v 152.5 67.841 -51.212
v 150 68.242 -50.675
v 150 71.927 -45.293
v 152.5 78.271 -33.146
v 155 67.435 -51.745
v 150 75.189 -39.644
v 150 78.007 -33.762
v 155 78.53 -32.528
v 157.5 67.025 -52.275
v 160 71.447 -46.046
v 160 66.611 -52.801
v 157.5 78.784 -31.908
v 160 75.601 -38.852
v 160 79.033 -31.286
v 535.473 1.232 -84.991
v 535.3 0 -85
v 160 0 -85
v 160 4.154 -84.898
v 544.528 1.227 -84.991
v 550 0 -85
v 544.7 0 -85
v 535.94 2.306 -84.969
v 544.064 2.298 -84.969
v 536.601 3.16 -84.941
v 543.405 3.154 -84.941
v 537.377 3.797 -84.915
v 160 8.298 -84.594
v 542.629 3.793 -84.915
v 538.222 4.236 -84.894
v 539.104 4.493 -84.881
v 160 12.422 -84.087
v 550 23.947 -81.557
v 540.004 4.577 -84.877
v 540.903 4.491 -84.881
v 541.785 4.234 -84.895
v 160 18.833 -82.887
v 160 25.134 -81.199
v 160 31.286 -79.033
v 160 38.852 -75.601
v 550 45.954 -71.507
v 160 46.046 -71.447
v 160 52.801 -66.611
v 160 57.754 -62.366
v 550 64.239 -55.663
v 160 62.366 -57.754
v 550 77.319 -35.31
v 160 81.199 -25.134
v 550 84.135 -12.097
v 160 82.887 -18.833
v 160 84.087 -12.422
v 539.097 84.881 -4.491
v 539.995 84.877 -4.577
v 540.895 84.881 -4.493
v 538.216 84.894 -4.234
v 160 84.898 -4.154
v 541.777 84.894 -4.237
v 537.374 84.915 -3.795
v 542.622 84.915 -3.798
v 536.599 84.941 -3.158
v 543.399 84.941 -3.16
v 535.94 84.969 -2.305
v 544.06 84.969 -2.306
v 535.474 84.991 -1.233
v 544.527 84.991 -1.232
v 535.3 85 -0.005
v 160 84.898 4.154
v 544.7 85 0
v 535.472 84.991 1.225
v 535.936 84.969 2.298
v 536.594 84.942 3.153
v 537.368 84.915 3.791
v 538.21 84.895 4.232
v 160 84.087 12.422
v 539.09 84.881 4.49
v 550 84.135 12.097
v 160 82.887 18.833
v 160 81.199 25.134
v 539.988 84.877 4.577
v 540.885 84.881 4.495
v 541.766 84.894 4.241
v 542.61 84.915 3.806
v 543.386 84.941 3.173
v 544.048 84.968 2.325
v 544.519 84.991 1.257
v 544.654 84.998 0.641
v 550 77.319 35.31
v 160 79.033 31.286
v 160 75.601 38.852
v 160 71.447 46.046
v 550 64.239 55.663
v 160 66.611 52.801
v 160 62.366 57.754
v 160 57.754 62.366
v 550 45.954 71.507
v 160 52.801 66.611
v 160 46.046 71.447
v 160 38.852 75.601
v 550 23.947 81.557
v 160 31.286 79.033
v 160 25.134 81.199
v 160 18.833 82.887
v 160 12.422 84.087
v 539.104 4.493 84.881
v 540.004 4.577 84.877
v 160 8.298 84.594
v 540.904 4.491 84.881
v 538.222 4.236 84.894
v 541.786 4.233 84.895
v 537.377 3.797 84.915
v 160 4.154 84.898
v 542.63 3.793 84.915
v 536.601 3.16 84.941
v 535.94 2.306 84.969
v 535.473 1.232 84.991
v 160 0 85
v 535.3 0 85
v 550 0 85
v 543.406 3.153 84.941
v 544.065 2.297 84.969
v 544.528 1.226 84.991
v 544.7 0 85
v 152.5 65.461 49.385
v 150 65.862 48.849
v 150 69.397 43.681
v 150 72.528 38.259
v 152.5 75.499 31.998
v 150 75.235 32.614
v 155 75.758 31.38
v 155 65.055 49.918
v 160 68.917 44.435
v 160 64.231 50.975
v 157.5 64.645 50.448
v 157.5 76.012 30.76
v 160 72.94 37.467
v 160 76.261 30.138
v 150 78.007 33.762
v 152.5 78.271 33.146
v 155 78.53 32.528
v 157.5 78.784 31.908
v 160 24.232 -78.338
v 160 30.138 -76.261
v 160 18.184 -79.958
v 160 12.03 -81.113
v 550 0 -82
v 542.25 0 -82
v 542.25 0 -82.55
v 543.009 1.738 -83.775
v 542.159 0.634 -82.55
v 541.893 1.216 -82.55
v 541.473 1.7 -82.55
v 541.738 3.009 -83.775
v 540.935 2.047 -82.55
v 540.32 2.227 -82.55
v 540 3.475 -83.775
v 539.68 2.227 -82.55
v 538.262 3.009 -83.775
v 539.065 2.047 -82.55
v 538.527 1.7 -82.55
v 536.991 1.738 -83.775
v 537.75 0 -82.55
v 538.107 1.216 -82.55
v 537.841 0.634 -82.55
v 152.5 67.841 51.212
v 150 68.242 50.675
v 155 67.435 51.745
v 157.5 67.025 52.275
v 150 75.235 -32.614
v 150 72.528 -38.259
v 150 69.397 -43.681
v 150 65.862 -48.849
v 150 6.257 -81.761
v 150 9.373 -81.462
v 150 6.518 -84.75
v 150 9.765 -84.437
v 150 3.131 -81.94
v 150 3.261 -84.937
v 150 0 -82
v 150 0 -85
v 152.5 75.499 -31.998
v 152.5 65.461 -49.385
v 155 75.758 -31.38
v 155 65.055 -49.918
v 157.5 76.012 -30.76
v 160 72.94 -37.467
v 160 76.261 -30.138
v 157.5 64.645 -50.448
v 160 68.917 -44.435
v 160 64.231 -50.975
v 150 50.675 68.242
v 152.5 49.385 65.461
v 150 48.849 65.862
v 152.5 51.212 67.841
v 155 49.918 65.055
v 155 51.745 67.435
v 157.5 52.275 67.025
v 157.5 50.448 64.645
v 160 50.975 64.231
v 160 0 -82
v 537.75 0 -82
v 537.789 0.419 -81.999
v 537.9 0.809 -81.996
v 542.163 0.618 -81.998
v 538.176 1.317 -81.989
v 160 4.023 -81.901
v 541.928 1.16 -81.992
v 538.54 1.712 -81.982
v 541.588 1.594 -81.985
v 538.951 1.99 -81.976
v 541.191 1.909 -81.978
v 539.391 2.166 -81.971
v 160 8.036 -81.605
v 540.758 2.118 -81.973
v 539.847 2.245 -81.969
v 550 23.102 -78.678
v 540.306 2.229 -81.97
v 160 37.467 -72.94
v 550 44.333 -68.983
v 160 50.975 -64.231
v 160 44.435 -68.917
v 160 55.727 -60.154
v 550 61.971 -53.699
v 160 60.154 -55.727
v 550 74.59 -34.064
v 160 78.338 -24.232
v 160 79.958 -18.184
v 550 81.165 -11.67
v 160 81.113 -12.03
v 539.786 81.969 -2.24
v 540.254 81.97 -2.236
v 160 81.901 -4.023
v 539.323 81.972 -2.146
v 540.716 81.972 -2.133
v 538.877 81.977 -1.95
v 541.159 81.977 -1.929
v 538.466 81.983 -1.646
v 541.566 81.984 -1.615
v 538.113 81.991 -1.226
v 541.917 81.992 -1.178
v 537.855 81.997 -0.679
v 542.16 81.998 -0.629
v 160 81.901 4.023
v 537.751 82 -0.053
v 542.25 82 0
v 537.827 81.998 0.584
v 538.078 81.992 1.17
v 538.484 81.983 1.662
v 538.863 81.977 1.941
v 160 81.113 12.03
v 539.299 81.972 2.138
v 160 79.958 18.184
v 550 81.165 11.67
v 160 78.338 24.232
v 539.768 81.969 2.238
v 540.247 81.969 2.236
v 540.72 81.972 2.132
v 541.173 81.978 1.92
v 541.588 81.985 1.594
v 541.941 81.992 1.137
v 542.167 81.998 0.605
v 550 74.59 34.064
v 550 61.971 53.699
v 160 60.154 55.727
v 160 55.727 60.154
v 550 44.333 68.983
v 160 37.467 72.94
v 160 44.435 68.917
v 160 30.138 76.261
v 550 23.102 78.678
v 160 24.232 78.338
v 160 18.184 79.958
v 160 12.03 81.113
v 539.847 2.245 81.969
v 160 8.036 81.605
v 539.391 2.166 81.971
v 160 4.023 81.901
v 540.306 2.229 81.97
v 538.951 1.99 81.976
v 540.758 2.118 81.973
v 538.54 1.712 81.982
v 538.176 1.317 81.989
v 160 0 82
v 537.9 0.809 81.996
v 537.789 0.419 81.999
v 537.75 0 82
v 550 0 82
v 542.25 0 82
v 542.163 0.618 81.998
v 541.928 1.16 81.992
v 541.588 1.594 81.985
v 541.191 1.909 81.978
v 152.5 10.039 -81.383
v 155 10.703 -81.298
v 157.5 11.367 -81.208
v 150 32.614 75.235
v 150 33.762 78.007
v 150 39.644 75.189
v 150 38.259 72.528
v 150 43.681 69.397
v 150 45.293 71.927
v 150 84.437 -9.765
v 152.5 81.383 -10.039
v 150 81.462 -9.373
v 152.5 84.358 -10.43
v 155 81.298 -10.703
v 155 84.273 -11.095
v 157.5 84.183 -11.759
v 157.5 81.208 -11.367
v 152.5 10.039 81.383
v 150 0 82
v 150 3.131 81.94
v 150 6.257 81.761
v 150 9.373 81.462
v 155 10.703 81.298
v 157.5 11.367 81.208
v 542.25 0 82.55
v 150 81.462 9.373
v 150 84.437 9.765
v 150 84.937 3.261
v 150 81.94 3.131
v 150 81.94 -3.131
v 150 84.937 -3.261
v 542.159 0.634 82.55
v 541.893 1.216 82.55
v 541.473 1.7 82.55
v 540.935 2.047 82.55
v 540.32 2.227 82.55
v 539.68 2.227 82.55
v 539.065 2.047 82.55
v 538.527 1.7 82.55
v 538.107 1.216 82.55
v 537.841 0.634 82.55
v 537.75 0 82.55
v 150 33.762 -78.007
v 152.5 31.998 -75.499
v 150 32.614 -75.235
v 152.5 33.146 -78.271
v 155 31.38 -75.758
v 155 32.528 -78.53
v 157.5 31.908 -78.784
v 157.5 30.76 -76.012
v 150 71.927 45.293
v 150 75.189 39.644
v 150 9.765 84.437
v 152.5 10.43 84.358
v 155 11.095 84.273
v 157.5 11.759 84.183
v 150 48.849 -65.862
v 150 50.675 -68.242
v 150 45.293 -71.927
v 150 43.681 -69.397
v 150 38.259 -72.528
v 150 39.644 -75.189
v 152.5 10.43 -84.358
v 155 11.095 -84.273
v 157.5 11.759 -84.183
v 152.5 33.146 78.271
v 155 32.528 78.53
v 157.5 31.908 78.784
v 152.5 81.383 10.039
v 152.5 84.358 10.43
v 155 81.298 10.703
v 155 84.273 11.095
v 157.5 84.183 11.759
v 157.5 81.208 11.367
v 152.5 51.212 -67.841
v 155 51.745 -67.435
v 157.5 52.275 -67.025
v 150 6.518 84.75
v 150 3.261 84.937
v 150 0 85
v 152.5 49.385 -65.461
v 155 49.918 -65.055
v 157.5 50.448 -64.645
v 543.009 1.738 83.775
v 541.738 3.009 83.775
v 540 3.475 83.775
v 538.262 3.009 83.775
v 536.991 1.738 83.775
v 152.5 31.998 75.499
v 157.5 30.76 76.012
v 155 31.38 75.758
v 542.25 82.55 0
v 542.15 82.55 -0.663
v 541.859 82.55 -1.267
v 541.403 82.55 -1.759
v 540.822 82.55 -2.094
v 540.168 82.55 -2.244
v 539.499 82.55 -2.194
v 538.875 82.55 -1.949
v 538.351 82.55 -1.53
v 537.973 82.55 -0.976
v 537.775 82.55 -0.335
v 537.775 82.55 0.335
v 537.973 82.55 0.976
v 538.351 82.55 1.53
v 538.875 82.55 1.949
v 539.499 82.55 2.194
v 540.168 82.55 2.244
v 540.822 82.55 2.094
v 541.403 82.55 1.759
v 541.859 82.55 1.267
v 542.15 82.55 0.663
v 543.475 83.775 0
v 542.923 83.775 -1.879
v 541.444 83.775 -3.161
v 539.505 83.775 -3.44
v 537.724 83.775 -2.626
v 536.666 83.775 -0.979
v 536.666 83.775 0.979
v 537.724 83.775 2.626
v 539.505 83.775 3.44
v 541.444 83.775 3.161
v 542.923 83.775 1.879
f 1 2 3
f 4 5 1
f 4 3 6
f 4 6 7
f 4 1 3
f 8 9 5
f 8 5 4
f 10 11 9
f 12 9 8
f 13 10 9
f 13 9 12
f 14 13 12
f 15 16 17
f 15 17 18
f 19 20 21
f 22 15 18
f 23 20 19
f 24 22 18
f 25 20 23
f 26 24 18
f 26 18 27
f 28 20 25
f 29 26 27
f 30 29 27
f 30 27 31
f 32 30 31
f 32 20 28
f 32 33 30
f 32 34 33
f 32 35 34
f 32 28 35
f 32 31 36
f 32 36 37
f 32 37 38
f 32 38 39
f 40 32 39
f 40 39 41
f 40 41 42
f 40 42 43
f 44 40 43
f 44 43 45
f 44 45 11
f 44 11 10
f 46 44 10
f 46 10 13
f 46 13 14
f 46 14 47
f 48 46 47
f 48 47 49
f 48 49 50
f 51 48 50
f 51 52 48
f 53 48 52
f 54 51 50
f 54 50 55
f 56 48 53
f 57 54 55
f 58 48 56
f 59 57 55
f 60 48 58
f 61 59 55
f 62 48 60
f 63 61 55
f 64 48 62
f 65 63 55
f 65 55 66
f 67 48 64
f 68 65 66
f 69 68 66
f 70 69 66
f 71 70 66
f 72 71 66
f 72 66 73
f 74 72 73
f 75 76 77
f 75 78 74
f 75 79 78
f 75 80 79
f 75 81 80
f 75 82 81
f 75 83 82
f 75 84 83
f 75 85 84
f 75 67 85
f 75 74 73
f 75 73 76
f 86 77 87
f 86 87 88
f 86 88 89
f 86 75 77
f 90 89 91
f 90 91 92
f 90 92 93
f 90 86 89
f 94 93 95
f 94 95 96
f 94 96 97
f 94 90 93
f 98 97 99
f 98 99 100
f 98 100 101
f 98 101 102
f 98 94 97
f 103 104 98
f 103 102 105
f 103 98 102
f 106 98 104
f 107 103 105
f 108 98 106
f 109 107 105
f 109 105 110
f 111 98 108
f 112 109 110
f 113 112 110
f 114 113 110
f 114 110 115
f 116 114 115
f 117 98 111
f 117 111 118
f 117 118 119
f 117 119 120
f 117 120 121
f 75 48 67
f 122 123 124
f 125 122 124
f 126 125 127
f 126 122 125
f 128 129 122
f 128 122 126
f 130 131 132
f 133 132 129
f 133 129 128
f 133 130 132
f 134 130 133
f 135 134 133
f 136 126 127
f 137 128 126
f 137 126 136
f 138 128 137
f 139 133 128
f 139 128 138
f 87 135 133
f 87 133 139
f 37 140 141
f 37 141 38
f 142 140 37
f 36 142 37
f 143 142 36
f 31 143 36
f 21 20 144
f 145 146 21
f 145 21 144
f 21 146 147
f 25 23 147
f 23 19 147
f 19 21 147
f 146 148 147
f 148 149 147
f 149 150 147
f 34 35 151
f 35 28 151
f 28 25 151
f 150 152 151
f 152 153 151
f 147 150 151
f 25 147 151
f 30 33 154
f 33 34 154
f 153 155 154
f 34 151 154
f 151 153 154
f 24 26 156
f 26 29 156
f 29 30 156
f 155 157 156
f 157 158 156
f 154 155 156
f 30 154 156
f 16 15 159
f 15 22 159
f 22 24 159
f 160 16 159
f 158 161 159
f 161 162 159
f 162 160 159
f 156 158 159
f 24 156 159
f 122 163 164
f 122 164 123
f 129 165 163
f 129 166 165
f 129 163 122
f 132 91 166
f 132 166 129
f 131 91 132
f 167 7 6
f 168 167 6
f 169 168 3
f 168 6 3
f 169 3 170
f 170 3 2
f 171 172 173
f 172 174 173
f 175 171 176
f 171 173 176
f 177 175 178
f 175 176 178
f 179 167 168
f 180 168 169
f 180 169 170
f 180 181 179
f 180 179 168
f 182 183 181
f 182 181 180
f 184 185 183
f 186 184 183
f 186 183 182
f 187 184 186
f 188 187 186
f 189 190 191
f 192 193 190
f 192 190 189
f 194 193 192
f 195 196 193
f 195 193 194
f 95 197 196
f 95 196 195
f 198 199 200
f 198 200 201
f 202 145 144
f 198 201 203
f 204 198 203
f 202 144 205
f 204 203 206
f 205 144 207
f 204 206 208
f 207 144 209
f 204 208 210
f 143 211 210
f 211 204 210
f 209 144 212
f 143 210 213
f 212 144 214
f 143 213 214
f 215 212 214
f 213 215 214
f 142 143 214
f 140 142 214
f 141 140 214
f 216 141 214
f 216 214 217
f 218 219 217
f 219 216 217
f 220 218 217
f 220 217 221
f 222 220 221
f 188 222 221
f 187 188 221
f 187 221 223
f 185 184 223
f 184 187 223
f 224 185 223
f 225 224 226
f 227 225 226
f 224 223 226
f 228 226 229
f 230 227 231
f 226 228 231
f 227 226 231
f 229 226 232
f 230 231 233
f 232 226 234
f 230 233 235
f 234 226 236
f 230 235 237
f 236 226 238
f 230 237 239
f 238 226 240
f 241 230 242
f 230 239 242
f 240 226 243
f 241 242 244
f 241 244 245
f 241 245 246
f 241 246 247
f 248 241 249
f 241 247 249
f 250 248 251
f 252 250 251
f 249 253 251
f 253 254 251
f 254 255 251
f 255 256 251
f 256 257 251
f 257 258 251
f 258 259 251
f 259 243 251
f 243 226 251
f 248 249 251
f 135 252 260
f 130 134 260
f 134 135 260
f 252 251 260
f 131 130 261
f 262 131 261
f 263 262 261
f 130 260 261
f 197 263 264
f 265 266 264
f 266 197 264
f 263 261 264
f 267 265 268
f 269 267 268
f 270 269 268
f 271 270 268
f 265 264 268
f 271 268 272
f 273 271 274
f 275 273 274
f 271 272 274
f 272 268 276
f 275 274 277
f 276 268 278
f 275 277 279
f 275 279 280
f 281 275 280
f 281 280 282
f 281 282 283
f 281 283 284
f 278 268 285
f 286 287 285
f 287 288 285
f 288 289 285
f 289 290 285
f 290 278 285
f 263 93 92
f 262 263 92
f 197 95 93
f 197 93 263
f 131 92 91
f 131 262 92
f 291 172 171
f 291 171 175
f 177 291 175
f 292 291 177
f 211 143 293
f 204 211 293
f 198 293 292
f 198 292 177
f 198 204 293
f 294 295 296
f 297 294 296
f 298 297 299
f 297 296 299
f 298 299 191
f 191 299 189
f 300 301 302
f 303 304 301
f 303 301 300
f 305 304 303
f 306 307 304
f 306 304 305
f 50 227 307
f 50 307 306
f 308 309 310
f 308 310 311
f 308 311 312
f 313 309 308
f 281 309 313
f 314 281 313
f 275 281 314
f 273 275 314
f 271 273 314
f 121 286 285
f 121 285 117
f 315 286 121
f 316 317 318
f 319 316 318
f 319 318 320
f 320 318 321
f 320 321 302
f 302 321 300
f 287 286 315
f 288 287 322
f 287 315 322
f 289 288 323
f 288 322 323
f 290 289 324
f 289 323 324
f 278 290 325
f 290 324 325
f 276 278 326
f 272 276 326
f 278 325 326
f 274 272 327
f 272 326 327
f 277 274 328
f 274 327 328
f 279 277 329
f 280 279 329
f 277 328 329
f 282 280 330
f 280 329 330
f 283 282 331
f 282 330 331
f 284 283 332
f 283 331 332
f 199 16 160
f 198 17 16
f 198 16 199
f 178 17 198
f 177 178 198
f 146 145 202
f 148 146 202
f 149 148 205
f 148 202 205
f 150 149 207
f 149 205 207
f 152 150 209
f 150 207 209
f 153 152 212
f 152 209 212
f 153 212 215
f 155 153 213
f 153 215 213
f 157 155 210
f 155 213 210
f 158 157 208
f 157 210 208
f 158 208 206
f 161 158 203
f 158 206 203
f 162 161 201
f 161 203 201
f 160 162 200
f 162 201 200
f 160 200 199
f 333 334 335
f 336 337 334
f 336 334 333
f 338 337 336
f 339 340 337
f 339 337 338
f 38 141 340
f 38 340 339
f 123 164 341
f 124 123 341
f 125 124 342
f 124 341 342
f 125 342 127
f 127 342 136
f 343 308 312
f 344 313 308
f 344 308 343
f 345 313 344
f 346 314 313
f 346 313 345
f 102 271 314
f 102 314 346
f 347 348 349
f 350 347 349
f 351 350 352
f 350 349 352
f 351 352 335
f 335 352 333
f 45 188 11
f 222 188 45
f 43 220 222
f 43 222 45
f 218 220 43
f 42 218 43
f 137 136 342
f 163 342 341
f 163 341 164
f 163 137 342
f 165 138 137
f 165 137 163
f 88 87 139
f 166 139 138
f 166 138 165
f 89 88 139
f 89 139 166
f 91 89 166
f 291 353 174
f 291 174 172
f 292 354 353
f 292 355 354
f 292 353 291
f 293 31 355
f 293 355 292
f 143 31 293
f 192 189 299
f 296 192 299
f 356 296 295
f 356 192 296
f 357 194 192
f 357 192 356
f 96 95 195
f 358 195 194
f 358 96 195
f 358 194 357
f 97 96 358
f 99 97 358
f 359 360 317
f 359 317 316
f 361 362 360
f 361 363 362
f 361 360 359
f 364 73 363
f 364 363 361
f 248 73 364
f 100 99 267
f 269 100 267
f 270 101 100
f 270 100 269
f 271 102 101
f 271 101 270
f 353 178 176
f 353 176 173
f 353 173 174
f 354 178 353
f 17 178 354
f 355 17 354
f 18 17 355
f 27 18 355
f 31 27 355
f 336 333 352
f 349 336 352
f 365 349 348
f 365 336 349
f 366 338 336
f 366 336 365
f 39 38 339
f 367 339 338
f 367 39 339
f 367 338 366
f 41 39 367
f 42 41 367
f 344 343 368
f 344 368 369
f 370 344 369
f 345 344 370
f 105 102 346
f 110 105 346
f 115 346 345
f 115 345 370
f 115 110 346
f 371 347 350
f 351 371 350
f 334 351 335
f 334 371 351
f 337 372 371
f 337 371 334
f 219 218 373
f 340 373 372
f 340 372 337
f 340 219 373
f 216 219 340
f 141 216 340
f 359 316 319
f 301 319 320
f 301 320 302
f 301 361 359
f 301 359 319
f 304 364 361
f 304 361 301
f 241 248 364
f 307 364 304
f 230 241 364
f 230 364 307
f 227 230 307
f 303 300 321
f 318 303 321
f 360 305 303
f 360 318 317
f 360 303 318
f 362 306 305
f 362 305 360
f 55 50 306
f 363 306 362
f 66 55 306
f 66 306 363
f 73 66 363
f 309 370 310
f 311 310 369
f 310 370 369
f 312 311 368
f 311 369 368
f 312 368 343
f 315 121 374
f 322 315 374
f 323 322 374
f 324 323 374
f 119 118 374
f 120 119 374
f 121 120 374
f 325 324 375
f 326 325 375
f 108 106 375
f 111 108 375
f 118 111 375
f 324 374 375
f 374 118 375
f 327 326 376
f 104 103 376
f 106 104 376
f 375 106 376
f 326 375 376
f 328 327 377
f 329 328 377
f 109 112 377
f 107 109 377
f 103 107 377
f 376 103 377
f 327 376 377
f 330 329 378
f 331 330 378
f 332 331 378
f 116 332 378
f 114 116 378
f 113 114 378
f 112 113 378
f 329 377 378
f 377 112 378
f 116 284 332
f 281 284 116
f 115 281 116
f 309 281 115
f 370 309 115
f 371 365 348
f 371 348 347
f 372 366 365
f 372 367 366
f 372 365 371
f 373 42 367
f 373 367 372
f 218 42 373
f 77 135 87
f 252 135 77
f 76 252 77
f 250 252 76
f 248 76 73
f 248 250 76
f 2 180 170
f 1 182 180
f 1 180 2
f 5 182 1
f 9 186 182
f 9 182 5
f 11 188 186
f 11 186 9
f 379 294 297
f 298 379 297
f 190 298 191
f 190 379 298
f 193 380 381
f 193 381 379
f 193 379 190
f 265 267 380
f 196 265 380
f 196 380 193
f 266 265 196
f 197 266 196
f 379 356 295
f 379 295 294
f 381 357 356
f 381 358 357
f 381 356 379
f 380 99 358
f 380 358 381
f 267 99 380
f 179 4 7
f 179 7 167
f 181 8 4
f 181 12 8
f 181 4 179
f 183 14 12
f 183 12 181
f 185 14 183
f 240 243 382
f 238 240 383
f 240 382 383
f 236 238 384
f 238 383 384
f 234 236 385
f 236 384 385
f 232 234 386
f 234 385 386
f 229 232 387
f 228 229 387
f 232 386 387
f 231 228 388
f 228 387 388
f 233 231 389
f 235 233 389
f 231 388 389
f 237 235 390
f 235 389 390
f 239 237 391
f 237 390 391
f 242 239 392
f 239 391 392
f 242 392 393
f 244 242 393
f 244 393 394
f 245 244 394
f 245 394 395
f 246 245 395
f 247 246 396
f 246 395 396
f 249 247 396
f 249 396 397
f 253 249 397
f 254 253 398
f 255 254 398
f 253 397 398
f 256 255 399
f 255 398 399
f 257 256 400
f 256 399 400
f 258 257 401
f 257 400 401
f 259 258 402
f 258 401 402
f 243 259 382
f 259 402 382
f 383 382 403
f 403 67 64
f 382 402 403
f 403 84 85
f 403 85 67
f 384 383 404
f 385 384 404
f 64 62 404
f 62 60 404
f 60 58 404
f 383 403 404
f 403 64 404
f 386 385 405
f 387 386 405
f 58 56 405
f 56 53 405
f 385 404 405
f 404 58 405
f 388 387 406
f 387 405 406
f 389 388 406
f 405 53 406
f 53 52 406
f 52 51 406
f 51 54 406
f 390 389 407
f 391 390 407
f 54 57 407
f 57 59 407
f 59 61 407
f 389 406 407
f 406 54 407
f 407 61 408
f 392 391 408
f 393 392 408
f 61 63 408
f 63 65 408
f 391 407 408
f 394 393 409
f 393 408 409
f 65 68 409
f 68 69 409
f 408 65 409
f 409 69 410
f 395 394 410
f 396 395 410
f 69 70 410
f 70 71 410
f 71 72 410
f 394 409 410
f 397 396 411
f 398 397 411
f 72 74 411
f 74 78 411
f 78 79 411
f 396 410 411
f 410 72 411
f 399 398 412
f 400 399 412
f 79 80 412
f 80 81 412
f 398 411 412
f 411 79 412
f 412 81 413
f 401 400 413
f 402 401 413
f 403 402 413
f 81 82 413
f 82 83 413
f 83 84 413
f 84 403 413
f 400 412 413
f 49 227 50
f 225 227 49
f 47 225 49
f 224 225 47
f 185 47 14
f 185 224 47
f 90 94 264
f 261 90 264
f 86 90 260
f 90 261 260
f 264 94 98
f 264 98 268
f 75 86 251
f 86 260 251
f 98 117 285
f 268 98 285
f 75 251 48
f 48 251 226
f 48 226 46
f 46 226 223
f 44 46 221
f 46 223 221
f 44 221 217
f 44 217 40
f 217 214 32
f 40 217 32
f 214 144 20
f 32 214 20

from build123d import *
from build123d.topology import SkipClean

# Parameters (mm, degrees)
SKETCH1_W                      = 390
SKETCH1_H                      = 3
BOSS_EXTRUDE1_DEPTH            = 5
DRAFT1_ANGLE                   = -15
CIRPATTERN1_COUNT              = 12
DRAFT1_OF_CIRPATTERN1_2_ANGLE  = -15
DRAFT1_OF_CIRPATTERN1_3_ANGLE  = -15
DRAFT1_OF_CIRPATTERN1_4_ANGLE  = -15
DRAFT1_OF_CIRPATTERN1_5_ANGLE  = -15
DRAFT1_OF_CIRPATTERN1_6_ANGLE  = -15
DRAFT1_OF_CIRPATTERN1_7_ANGLE  = -15
DRAFT1_OF_CIRPATTERN1_8_ANGLE  = -15
DRAFT1_OF_CIRPATTERN1_9_ANGLE  = -15
DRAFT1_OF_CIRPATTERN1_10_ANGLE = -15
DRAFT1_OF_CIRPATTERN1_11_ANGLE = -15
DRAFT1_OF_CIRPATTERN1_12_ANGLE = -15
SKETCH3_OUTSIDE_W              = 265.338
SKETCH3_OUTSIDE_H              = 265.338
CUT_EXTRUDE1_DEPTH             = 563.983125857


# Read off the part's stored shape, not the designer's step: CSK for M4 Countersunk Flat Head Screw1
with BuildPart() as part:
    # Sketch1 → Revolve1 (revolve)
    with BuildSketch(Plane.XY, mode=Mode.PRIVATE) as revolve1_sk:
        with Locations((355, 83.5)):
            Rectangle(SKETCH1_W, SKETCH1_H)
    revolve(revolve1_sk.sketch.rotate(Axis((0, 0, 0), (1, 0, 0)), 90), axis=Axis((0, 0, 0), (1, 0, 0)))

    # Sketch2 → Boss-Extrude1 (add, symmetric)
    with BuildSketch(Plane(origin=(155, 0, 0), x_dir=(0, 0, -1), z_dir=(1, 0, 0))):
        with BuildLine():
            Line((10.703147762, 81.298478633), (11.094726339, 84.272813217))
            ThreePointArc((11.094726339, 84.272813217), (0, 85), (-11.094726339, 84.272813217))
            Line((-11.094726339, 84.272813217), (-10.703147762, 81.298478633))
            ThreePointArc((-10.703147762, 81.298478633), (0, 82), (10.703147762, 81.298478633))
        make_face()
    boss_extrude1 = extrude(amount=BOSS_EXTRUDE1_DEPTH, both=True)

    # Draft1
    draft1_faces = [part.faces().sort_by_distance(p)[0] for p in [
        (155, 82.785645925, 10.89893705),
        (155, 82.785645925, -10.89893705),
    ]]
    draft(draft1_faces, Plane(origin=(155, 0, 0), x_dir=(0, 0, 1), z_dir=(1, 0, 0)), DRAFT1_ANGLE)

    # CirPattern1: Boss-Extrude1 ×12 about axis
    with SkipClean():  # the faces are left unmerged after this step: merging them gives an invalid solid
        cirpattern1_axis = Axis((0, 0, 0), (1, 0, 0))
        for i in range(1, CIRPATTERN1_COUNT):
            add(boss_extrude1.rotate(cirpattern1_axis, i * 360 / CIRPATTERN1_COUNT))

    # Draft1 of CirPattern1 2
    draft1_of_cirpattern1_2_faces = [part.faces().sort_by_distance(p)[0] for p in [
        (155, 66.245003914, 50.831579322),
        (155, 77.143940965, 31.954066602),
    ]]
    draft(draft1_of_cirpattern1_2_faces, Plane(origin=(155, 0, 0), x_dir=(0, -0.49999999999999994, 0.8660254037844387), z_dir=(1, 0, 0)), DRAFT1_OF_CIRPATTERN1_2_ANGLE)

    # Draft1 of CirPattern1 3
    draft1_of_cirpattern1_3_faces = [part.faces().sort_by_distance(p)[0] for p in [
        (155, 31.954066602, 77.143940965),
        (155, 50.831579322, 66.245003914),
    ]]
    draft(draft1_of_cirpattern1_3_faces, Plane(origin=(155, 0, 0), x_dir=(0, -0.8660254037844386, 0.5000000000000001), z_dir=(1, 0, 0)), DRAFT1_OF_CIRPATTERN1_3_ANGLE)

    # Draft1 of CirPattern1 4
    draft1_of_cirpattern1_4_faces = [part.faces().sort_by_distance(p)[0] for p in [
        (155, -10.89893705, 82.785645925),
        (155, 10.89893705, 82.785645925),
    ]]
    draft(draft1_of_cirpattern1_4_faces, Plane(origin=(155, 0, 0), x_dir=(0, -1, 0), z_dir=(1, 0, 0)), DRAFT1_OF_CIRPATTERN1_4_ANGLE)

    # Draft1 of CirPattern1 5
    draft1_of_cirpattern1_5_faces = [part.faces().sort_by_distance(p)[0] for p in [
        (155, -50.831579322, 66.245003914),
        (155, -31.954066602, 77.143940965),
    ]]
    draft(draft1_of_cirpattern1_5_faces, Plane(origin=(155, 0, 0), x_dir=(0, -0.8660254037844387, -0.4999999999999998), z_dir=(1, 0, 0)), DRAFT1_OF_CIRPATTERN1_5_ANGLE)

    # Draft1 of CirPattern1 6
    draft1_of_cirpattern1_6_faces = [part.faces().sort_by_distance(p)[0] for p in [
        (155, -77.143940965, 31.954066602),
        (155, -66.245003914, 50.831579322),
    ]]
    draft(draft1_of_cirpattern1_6_faces, Plane(origin=(155, 0, 0), x_dir=(0, -0.49999999999999994, -0.8660254037844387), z_dir=(1, 0, 0)), DRAFT1_OF_CIRPATTERN1_6_ANGLE)

    # Draft1 of CirPattern1 7
    draft1_of_cirpattern1_7_faces = [part.faces().sort_by_distance(p)[0] for p in [
        (155, -82.785645925, -10.89893705),
        (155, -82.785645925, 10.89893705),
    ]]
    draft(draft1_of_cirpattern1_7_faces, Plane(origin=(155, 0, 0), x_dir=(0, 0, -1), z_dir=(1, 0, 0)), DRAFT1_OF_CIRPATTERN1_7_ANGLE)

    # Draft1 of CirPattern1 8
    draft1_of_cirpattern1_8_faces = [part.faces().sort_by_distance(p)[0] for p in [
        (155, -66.245003914, -50.831579322),
        (155, -77.143940965, -31.954066602),
    ]]
    draft(draft1_of_cirpattern1_8_faces, Plane(origin=(155, 0, 0), x_dir=(0, 0.5000000000000001, -0.8660254037844386), z_dir=(1, 0, 0)), DRAFT1_OF_CIRPATTERN1_8_ANGLE)

    # Draft1 of CirPattern1 9
    draft1_of_cirpattern1_9_faces = [part.faces().sort_by_distance(p)[0] for p in [
        (155, -31.954066602, -77.143940965),
        (155, -50.831579322, -66.245003914),
    ]]
    draft(draft1_of_cirpattern1_9_faces, Plane(origin=(155, 0, 0), x_dir=(0, 0.8660254037844384, -0.5000000000000004), z_dir=(1, 0, 0)), DRAFT1_OF_CIRPATTERN1_9_ANGLE)

    # Draft1 of CirPattern1 10
    draft1_of_cirpattern1_10_faces = [part.faces().sort_by_distance(p)[0] for p in [
        (155, 10.89893705, -82.785645925),
        (155, -10.89893705, -82.785645925),
    ]]
    draft(draft1_of_cirpattern1_10_faces, Plane.YZ.offset(155), DRAFT1_OF_CIRPATTERN1_10_ANGLE)

    # Draft1 of CirPattern1 11
    draft1_of_cirpattern1_11_faces = [part.faces().sort_by_distance(p)[0] for p in [
        (155, 50.831579322, -66.245003914),
        (155, 31.954066602, -77.143940965),
    ]]
    draft(draft1_of_cirpattern1_11_faces, Plane(origin=(155, 0, 0), x_dir=(0, 0.8660254037844386, 0.5000000000000001), z_dir=(1, 0, 0)), DRAFT1_OF_CIRPATTERN1_11_ANGLE)

    # Draft1 of CirPattern1 12
    draft1_of_cirpattern1_12_faces = [part.faces().sort_by_distance(p)[0] for p in [
        (155, 77.143940965, -31.954066602),
        (155, 66.245003914, -50.831579322),
    ]]
    draft(draft1_of_cirpattern1_12_faces, Plane(origin=(155, 0, 0), x_dir=(0, 0.5000000000000004, 0.8660254037844384), z_dir=(1, 0, 0)), DRAFT1_OF_CIRPATTERN1_12_ANGLE)

    # Sketch3 outside → Cut-Extrude1 (cut, through all)
    with SkipClean():  # the faces are left unmerged after this step: merging them gives an invalid solid
        with BuildSketch(Plane(origin=(0, 0, 0), x_dir=(0, 0, -1), z_dir=(1, 0, 0))):
            Rectangle(SKETCH3_OUTSIDE_W, SKETCH3_OUTSIDE_H)
            with BuildLine():
                Line((0, 0), (-85, 0))
                ThreePointArc((-85, 0), (0, 85), (85, 0))
                Line((85, 0), (0, 0))
            make_face(mode=Mode.SUBTRACT)
        extrude(amount=CUT_EXTRUDE1_DEPTH, mode=Mode.SUBTRACT)

    # CSK for M4 Countersunk Flat Head Scr 2 → CSK for M4 Countersunk Flat Head Screw1 (revolve, cut)
    with SkipClean():  # the faces are left unmerged after this step: merging them gives an invalid solid
        with BuildSketch(Plane(origin=(540, 0, 0), x_dir=(1, 0, 0), z_dir=(0, 0, 1))):
            Polygon((4.700033545, 85.000033545), (0, 85.000033545), (0, 81.96910869), (2.25, 81.96910869), (2.25, 82.55), align=None)
        revolve(axis=Axis((540, 0, 0), (0, 1, 0)), mode=Mode.SUBTRACT)

    # CSK for M4 Countersunk Flat Head Scr 3 o → CSK for M4 Countersunk Flat Head Scr 3 (revolve, cut)
    with SkipClean():  # the faces are left unmerged after this step: merging them gives an invalid solid
        with BuildSketch(Plane(origin=(540, 0, 0), x_dir=(1, 0, 0), z_dir=(0, -1, 0))):
            Polygon((0, -85.000002015), (4.700002015, -85.000002015), (2.25, -82.55), (2.25, -81.969112603), (0, -81.969112603), align=None)
            Polygon((0, 81.969112603), (2.25, 81.969112603), (2.25, 82.55), (4.700002015, 85.000002015), (0, 85.000002015), align=None)
        revolve(axis=Axis((540, 0, 0), (0, 0, 1)), mode=Mode.SUBTRACT)


solid = part.part
